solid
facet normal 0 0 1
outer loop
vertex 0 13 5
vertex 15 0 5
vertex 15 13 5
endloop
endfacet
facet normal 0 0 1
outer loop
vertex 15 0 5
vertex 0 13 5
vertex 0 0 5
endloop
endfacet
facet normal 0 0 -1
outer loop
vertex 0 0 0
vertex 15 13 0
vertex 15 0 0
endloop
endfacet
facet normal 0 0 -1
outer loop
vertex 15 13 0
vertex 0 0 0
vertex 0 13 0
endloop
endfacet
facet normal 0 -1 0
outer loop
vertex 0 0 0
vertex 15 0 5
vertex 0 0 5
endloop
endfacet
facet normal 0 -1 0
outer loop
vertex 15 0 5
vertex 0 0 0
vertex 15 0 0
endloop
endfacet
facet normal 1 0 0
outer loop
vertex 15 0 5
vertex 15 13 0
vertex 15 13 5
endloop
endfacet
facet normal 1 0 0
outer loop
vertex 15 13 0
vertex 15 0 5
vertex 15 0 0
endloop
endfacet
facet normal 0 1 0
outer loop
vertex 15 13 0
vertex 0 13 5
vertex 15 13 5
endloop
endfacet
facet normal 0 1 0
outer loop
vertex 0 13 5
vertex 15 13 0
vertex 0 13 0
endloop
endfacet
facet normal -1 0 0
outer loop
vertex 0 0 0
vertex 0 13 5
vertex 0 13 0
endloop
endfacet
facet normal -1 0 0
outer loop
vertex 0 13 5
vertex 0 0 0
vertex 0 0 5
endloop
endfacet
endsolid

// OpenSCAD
// Generated by SolidPython 1.0.1 on 2020-07-29 00:46:55


cube(size = [15, 13, 5]);
/***********************************************
*********      SolidPython code:      **********
************************************************
 
# import packages: SolidPython
from solid import *
from solid.utils import *
from itertools import chain, combinations, permutations


class Resize:

    def __init__(self, scad_file):
        self.scad_file = scad_file
        #self.scad_file = import_scad(scad_file)
        # cone/cylinder param:
        self.r1 = 0
        self.r2 = 0
        self.h = 0
        # rectangular prism param:
        self.w = 0
        self.l = 0
        # ellipse param:
        self.r = 0

    # import OpenScad code (file name corresponds to shape)


    # classify shape + parameters
    def assign(self, param1, param2, param3):
        if self.scad_file == 'cone.scad':
            self.r1 = param1
            self.r2 = param2
            self.h = param3
        elif self.scad_file == 'cylinder.scad':
            self.r1 = param1
            self.r2 = param2
            self.h = param3
        elif self.scad_file == 'rectangularPrism.scad':
            self.h = param1
            self.l = param2
            self.w = param3
        else:
            self.r = param1
            self.h = param2

    # resize parameters
    def iterate(self):
        x = range(3, 20, 2)
        i = 1
        if self.scad_file == 'cone.scad':
            tempList = list(permutations(x, 2))
            for temp in tempList:
                param1 = temp[0]
                param2 = temp[1]
                filepath = 'produced_scad_files/' + 'cone' + str(param1) + '_' + str(param2) + '_' + '.scad'
                scad_render_to_file(cylinder(h=param1, r1=param2, r2=0), filepath)

        elif self.scad_file == 'cylinder.scad':
            tempList = list(permutations(x, 3))
            for temp in tempList:
                param1 = temp[0]
                param2 = temp[1]
                filepath = 'produced_scad_files/' + 'cylinder' + str(param1) + '_' + str(param2) + '_' + '.scad'
                scad_render_to_file(cylinder(h=param1, r1=param2, r2=param2), filepath)

        elif self.scad_file == 'rectangularPrism.scad':
            tempList = list(permutations(x, 3))
            for temp in tempList:
                param1 = temp[0]
                param2 = temp[1]
                param3 = temp[2]
                filepath = 'produced_scad_files/' + 'rectangularPrism' + str(param1) + '_' + str(param2) + '_' + str(
                    param3) + '.scad'
                scad_render_to_file(cube(size=(param1, param2, param3)), filepath)

        elif self.scad_file == 'ellipse.scad':
            tempList = list(permutations(x, 4))
            for temp in tempList:
                param1 = temp[0]
                param2 = temp[1]
                param3 = temp[2]
                param4 = temp[3]
                filepath = 'produced_scad_files/' + 'ellipse' + str(param1) + '_' + str(param2) + '_' + str(param3) + '_' + str(param4) + '.scad'
                scad_render_to_file(scale([param1, param2, param3])(sphere(r=param4)), filepath)

    def render_to_scadfile(self):
        scad_render_to_file(scad, 'example.scad') 
 
************************************************/
